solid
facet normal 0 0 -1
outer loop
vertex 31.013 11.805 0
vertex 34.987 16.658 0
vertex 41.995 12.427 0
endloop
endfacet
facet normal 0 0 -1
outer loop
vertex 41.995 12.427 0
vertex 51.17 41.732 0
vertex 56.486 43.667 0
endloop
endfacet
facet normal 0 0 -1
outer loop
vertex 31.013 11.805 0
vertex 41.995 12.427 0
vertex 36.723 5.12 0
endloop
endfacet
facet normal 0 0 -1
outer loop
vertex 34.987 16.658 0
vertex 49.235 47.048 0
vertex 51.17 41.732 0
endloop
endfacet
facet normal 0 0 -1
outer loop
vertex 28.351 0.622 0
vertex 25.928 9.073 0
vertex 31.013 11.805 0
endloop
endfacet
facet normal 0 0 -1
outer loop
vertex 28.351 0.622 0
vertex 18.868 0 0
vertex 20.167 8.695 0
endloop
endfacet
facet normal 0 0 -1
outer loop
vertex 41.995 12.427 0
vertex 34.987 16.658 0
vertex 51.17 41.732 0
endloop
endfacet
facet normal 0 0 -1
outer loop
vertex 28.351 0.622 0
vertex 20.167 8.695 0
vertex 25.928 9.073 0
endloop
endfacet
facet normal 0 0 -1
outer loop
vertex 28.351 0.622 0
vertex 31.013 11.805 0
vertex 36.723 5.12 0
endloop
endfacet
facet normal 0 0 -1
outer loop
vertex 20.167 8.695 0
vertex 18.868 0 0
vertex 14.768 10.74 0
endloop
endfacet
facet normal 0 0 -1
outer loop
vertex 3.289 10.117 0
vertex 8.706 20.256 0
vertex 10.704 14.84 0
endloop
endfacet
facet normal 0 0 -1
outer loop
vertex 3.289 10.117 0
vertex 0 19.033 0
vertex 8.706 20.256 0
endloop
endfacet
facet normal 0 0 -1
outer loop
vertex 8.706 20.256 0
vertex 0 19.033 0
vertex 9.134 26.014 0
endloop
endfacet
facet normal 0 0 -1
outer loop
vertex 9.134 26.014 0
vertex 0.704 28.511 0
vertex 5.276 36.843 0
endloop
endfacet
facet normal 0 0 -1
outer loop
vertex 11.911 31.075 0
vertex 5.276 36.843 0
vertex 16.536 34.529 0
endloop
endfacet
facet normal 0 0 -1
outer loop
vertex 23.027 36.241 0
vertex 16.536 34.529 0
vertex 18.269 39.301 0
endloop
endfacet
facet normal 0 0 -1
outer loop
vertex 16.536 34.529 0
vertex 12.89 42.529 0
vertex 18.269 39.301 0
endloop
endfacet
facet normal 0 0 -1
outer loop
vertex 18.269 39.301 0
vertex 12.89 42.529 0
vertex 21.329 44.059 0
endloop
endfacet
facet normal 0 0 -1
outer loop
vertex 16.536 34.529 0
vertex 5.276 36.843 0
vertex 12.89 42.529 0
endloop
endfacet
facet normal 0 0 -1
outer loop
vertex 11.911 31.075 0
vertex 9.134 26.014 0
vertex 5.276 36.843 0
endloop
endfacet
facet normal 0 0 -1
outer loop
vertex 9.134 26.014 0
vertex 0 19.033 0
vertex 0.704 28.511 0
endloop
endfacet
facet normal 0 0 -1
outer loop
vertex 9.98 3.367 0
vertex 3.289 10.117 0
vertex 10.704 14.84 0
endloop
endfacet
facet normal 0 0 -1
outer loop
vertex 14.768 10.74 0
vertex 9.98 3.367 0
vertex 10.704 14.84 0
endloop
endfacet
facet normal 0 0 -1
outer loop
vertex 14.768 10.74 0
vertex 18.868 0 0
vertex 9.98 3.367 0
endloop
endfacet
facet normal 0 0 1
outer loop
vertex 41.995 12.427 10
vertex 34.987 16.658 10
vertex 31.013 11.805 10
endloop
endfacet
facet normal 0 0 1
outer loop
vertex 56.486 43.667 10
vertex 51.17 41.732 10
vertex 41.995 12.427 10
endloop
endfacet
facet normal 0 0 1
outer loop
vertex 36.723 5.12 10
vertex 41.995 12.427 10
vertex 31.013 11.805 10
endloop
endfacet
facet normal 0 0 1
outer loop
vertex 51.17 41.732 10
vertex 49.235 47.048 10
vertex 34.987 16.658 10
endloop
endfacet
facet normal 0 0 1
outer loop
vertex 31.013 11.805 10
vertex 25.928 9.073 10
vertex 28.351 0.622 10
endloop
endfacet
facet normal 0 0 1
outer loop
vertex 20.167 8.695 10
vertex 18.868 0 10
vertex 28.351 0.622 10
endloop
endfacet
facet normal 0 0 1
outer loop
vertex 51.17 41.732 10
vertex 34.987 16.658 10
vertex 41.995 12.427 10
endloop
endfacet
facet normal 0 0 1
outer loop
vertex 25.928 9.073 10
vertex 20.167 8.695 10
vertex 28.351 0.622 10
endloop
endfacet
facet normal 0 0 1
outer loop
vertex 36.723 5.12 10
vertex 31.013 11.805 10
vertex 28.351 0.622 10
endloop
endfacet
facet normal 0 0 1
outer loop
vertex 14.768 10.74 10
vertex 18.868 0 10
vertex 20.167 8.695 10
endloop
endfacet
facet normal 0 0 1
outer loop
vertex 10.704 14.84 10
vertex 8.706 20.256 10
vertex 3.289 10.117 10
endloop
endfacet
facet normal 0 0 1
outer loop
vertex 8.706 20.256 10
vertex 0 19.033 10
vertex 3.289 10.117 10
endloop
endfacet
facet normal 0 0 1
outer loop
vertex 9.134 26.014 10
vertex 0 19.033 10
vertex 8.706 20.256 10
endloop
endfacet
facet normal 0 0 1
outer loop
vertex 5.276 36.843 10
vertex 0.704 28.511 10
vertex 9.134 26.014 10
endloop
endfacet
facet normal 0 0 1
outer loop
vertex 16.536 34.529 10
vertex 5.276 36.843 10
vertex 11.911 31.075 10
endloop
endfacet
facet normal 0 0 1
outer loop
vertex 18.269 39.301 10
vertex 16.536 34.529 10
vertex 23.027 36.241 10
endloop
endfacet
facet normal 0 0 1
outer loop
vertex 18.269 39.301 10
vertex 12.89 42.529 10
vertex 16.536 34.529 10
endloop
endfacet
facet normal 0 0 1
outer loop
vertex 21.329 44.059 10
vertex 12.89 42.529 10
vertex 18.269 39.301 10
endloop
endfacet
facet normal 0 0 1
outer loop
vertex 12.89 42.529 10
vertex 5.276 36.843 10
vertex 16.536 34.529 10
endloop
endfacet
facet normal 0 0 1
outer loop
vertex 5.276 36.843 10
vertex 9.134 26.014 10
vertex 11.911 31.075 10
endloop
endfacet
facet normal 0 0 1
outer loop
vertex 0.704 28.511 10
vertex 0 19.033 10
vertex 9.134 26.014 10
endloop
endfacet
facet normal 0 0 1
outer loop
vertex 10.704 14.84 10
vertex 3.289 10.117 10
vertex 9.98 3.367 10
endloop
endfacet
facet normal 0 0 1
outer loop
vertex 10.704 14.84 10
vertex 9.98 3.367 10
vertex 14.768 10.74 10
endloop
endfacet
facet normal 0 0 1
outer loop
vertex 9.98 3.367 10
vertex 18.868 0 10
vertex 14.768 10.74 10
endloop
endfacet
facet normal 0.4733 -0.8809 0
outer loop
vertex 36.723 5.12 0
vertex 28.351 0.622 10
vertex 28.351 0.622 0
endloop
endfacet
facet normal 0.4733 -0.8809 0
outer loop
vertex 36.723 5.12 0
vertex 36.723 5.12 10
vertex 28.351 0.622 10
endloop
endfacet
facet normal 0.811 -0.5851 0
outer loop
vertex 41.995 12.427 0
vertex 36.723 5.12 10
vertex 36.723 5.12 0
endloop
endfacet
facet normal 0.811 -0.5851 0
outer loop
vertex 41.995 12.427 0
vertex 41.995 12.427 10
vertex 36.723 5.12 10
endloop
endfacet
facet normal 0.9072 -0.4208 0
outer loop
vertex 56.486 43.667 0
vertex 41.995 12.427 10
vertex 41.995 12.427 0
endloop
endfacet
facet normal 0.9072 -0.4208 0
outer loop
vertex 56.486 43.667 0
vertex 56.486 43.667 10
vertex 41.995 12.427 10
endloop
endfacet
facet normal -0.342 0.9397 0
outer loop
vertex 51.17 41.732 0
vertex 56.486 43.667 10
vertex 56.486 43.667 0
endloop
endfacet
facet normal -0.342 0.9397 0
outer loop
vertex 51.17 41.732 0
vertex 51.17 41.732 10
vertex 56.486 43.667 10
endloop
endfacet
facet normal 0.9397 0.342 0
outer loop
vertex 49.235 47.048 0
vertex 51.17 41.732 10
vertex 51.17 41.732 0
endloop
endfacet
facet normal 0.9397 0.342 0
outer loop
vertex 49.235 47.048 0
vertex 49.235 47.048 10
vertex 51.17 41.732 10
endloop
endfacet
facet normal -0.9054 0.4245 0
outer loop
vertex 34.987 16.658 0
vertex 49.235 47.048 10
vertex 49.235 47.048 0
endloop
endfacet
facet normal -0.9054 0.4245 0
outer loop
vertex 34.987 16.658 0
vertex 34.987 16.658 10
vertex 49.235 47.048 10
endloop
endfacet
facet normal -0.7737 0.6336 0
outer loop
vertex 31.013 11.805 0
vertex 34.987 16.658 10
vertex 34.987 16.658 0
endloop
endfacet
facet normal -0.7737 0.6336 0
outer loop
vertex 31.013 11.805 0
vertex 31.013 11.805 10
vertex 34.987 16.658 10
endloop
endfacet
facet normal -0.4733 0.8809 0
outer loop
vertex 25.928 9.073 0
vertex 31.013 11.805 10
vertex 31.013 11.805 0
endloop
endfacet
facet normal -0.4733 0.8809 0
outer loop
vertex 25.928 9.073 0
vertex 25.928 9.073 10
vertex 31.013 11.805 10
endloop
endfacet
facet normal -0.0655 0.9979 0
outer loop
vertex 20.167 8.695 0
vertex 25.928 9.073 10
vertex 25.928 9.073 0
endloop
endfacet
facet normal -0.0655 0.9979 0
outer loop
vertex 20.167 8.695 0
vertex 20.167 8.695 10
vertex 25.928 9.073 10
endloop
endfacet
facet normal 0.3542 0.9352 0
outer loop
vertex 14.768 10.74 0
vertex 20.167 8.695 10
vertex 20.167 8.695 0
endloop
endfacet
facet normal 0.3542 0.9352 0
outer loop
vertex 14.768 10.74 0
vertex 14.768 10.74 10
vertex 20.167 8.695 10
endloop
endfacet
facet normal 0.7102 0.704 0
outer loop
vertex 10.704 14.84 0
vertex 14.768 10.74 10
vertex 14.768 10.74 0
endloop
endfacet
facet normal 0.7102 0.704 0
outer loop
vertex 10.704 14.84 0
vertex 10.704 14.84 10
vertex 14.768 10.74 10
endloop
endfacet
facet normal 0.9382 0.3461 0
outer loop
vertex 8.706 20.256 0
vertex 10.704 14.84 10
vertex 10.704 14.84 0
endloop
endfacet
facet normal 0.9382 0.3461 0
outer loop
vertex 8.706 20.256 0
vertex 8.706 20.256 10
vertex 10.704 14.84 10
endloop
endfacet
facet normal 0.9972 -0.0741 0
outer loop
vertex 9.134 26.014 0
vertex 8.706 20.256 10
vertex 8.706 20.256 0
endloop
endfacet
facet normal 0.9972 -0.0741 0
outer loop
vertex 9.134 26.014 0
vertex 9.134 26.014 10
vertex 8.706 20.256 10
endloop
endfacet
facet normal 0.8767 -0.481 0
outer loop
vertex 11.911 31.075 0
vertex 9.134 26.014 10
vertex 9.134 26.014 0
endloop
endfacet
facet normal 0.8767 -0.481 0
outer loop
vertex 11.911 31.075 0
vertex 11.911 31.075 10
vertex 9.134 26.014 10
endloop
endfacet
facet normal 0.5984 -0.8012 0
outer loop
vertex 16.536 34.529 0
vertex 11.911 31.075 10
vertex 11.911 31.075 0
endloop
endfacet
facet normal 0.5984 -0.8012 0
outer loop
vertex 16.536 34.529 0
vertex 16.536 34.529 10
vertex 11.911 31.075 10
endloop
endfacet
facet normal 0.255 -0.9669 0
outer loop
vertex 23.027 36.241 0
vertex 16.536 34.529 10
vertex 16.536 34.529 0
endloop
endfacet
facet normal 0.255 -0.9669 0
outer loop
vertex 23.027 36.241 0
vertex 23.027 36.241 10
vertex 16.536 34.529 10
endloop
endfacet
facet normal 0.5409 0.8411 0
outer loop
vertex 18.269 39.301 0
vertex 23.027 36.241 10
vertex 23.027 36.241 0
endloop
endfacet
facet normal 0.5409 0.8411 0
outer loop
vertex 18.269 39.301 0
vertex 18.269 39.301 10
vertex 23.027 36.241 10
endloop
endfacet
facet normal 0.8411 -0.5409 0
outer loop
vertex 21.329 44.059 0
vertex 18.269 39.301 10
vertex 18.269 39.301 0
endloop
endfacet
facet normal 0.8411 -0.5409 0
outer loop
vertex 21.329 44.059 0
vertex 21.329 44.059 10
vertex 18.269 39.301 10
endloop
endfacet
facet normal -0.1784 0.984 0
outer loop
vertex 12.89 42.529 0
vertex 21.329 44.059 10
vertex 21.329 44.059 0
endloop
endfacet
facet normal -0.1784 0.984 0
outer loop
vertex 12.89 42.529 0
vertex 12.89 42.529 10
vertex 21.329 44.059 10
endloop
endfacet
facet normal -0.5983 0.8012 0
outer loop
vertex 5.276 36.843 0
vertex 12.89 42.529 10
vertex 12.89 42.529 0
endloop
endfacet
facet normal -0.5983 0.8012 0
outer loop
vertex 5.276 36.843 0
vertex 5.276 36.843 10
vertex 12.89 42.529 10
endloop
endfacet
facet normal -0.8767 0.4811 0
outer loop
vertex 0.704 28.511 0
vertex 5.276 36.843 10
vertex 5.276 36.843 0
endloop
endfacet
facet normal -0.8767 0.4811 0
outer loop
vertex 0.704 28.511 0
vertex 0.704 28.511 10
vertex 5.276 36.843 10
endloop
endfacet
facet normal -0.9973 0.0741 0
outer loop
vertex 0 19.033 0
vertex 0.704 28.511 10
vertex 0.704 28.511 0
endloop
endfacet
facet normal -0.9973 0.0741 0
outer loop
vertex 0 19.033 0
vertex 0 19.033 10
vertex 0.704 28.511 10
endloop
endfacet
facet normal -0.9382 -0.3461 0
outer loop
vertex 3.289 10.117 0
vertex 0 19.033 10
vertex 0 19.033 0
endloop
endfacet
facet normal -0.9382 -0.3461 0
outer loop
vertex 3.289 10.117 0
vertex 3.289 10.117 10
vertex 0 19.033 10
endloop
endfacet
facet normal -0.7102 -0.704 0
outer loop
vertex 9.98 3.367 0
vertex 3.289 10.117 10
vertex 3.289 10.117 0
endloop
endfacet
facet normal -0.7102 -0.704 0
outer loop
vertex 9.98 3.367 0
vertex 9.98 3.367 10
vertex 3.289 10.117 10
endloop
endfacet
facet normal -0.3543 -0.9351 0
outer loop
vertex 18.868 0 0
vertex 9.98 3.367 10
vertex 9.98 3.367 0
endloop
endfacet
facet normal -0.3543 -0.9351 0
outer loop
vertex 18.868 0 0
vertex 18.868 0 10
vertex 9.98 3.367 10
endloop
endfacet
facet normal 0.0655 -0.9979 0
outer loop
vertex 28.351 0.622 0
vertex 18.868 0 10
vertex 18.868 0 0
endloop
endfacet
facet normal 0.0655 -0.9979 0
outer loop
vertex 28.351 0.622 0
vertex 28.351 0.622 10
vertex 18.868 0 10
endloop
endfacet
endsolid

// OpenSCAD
$fn = 32;

// ----------------------------------------------------------------------
// Hook plate: curl radius 18 mm over 245 degrees, 8 mm thick band
// ----------------------------------------------------------------------

// --- parameters (mm) ---
profile_height = 10;      // extrusion height
profile_points = 26;      // points of the closed outline

profile = [[18.269, 39.301], [21.329, 44.059], [12.89, 42.529], [5.276, 36.843], [0.704, 28.511], [0, 19.033], [3.289, 10.117], [9.98, 3.367], [18.868, 0], [28.351, 0.622], [36.723, 5.12], [41.995, 12.427], [56.486, 43.667], [51.17, 41.732], [49.235, 47.048], [34.987, 16.658], [31.013, 11.805], [25.928, 9.073], [20.167, 8.695], [14.768, 10.74], [10.704, 14.84], [8.706, 20.256], [9.134, 26.014], [11.911, 31.075], [16.536, 34.529], [23.027, 36.241]];  // single closed polygon, 26 points, counter clockwise

// --- the one profile operation ---
linear_extrude(height = profile_height) polygon(points = profile);
